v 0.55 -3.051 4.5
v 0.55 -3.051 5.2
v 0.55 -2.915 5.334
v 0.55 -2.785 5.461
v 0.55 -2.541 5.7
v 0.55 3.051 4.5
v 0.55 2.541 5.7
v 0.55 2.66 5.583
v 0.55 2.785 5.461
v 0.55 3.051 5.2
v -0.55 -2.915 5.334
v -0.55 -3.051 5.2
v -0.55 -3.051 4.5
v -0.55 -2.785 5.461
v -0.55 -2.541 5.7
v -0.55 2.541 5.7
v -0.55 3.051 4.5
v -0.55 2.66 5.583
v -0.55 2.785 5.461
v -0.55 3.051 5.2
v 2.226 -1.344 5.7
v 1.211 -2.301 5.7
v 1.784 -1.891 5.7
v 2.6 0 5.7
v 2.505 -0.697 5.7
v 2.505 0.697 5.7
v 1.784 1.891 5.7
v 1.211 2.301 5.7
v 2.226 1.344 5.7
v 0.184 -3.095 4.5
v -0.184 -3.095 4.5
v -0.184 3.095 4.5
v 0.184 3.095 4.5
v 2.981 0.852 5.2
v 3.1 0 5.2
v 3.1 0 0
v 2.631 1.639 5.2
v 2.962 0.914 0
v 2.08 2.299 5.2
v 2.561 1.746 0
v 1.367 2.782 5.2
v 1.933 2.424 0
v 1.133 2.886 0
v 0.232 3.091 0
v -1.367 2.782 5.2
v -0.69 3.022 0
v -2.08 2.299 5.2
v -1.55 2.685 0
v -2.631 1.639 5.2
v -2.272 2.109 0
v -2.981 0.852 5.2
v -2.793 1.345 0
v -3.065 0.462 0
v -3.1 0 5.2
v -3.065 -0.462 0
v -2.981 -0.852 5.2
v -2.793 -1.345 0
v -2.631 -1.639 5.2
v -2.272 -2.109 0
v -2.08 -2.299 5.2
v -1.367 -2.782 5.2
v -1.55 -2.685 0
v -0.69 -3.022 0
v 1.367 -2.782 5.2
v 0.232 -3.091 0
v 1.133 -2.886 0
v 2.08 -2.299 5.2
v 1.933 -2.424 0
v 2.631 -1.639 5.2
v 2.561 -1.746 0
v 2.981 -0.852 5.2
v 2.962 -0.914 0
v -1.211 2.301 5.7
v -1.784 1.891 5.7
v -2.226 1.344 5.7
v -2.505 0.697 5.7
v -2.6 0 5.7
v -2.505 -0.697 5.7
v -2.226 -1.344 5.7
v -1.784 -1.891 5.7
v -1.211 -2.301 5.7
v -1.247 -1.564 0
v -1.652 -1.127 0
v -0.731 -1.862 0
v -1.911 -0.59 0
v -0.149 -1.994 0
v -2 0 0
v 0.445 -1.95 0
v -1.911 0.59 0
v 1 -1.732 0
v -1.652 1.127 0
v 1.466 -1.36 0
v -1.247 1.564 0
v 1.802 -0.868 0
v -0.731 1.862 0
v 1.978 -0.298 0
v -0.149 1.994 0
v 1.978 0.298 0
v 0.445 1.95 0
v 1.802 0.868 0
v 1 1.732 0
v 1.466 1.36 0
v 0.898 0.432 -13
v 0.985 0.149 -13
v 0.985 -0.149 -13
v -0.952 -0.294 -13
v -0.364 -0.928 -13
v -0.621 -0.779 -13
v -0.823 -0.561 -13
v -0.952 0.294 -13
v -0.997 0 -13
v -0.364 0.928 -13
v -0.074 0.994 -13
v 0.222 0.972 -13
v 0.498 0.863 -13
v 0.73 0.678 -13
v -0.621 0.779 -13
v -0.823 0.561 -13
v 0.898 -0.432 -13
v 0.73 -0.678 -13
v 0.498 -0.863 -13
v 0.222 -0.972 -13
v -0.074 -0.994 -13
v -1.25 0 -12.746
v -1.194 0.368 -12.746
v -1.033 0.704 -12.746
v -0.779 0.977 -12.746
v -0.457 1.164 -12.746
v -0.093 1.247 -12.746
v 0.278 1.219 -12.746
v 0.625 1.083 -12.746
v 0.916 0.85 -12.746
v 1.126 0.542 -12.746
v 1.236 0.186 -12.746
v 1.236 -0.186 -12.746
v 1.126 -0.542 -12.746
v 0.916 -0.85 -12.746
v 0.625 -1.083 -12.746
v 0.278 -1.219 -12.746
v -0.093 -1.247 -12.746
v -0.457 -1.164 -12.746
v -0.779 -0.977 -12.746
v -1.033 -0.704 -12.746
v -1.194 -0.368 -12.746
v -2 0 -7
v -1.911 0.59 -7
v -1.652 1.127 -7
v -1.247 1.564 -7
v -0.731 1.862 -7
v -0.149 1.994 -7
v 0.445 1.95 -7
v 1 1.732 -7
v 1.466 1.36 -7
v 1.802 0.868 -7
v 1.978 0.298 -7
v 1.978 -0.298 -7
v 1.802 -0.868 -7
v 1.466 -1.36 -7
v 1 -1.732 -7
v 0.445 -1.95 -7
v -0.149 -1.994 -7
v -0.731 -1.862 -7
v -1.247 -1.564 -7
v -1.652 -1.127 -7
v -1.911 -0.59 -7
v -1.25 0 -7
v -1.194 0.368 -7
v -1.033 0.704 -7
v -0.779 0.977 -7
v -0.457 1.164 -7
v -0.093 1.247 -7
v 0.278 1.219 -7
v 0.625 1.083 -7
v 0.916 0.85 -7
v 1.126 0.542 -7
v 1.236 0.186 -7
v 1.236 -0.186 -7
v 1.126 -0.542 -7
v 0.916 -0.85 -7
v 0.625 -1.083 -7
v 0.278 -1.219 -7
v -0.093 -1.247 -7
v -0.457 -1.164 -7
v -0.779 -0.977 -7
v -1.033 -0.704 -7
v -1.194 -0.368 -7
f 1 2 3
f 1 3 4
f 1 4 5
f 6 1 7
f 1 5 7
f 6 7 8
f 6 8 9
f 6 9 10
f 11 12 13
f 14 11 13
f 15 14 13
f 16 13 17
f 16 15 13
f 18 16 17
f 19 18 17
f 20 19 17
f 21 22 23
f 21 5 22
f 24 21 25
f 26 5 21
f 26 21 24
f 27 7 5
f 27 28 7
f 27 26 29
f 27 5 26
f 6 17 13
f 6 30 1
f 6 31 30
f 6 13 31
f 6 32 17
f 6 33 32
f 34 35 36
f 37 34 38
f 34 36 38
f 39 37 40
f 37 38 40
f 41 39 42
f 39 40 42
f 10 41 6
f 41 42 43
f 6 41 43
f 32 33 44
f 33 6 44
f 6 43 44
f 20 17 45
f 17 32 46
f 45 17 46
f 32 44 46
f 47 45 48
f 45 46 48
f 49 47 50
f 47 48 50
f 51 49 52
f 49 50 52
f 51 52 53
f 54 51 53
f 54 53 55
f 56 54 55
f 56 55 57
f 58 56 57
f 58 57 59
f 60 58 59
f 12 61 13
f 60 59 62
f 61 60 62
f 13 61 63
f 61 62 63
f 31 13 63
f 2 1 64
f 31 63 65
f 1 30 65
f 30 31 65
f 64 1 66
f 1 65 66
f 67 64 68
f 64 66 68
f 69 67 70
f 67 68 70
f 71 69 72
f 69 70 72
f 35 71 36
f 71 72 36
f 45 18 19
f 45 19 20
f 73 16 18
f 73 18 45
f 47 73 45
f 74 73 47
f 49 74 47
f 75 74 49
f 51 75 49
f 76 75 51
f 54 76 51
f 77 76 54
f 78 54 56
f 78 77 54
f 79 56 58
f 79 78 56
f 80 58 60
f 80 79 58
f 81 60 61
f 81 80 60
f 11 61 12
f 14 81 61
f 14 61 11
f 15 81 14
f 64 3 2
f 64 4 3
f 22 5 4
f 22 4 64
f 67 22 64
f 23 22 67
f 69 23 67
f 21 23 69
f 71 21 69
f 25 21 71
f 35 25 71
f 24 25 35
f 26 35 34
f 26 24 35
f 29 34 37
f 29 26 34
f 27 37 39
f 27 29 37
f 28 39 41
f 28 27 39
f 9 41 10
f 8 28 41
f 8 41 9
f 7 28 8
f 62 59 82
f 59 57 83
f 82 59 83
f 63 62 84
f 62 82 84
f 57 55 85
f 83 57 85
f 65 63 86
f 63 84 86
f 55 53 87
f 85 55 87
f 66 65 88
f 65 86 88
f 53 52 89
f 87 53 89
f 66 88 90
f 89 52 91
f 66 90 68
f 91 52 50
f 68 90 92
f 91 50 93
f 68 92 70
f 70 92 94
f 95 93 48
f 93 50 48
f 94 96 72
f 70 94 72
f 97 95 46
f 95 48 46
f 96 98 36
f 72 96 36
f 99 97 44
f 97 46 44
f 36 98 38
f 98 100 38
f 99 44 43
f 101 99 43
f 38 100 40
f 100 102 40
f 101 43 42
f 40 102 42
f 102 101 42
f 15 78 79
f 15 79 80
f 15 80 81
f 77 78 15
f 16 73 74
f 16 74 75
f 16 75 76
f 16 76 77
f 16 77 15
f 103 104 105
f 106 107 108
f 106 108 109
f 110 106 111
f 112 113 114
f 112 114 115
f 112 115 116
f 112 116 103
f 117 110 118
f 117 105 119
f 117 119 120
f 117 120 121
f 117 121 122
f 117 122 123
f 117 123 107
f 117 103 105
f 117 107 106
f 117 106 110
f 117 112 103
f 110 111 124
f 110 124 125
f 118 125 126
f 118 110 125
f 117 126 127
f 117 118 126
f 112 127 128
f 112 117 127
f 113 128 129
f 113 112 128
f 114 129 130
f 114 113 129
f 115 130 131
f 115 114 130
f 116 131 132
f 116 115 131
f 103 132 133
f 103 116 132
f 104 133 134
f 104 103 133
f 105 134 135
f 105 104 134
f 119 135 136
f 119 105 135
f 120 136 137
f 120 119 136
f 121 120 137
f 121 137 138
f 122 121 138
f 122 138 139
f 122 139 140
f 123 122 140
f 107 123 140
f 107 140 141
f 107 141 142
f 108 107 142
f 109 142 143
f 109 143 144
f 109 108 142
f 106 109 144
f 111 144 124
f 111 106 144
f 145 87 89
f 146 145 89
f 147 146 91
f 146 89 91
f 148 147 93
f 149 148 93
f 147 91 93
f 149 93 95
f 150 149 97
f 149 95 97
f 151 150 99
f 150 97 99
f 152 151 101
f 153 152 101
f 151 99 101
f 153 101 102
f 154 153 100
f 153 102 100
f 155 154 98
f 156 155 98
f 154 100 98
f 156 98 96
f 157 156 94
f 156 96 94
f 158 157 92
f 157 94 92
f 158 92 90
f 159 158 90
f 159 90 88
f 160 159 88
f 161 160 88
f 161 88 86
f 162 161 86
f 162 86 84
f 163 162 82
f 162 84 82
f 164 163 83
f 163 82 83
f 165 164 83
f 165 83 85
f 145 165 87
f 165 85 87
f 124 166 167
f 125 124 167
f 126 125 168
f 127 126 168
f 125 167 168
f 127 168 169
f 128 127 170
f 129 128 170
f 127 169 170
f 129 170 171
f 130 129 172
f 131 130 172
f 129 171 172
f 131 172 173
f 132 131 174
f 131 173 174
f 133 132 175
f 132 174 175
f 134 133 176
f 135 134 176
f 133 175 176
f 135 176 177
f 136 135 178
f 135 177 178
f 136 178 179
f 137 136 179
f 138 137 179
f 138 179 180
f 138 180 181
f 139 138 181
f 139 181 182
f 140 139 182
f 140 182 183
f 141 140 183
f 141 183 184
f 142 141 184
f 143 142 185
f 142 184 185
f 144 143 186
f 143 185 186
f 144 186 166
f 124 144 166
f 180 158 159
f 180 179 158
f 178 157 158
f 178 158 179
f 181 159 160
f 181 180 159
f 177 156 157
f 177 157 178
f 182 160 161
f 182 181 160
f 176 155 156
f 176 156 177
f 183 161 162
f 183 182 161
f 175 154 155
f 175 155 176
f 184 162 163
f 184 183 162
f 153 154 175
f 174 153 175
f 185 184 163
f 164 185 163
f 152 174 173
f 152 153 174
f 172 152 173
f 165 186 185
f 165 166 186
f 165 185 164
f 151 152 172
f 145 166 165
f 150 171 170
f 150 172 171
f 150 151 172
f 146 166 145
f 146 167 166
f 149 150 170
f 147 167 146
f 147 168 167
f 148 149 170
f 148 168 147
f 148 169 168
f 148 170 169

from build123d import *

# Parameters (mm, degrees)
SKETCH_1_R          = 3.1
EXTRUDE_1_DEPTH     = 5.7
SKETCH_2_R          = 2
EXTRUDE_2_DEPTH     = 7
SKETCH_3_R          = 1.25
EXTRUDE_3_DEPTH     = 6
CHAMFER_1_SIZE      = 0.2535
CHAMFER_2_SIZE      = 0.5
SKETCH_5_W          = 1.1
SKETCH_5_H          = 7
CUT_EXTRUDE_1_DEPTH = 1.2


with BuildPart() as part:
    # Эскиз1 → Бобышка-Вытянуть1 (new body)
    with BuildSketch(Plane.XY):
        Circle(SKETCH_1_R)
    extrude(amount=EXTRUDE_1_DEPTH)

    # Эскиз2 → Бобышка-Вытянуть2 (add)
    with BuildSketch(Plane(origin=(0, 0, 0), x_dir=(-1, 0, 0), z_dir=(0, 0, -1))):
        Circle(SKETCH_2_R)
    extrude(amount=EXTRUDE_2_DEPTH)

    # Эскиз3 → Бобышка-Вытянуть3 (add)
    with BuildSketch(Plane(origin=(0, 0, -7), x_dir=(-1, 0, 0), z_dir=(0, 0, -1))):
        Circle(SKETCH_3_R)
    extrude(amount=EXTRUDE_3_DEPTH)

    # Фаска1
    chamfer_1_edges = [part.edges().sort_by_distance(p)[0] for p in [
        (1.25, 0, -13),
    ]]
    chamfer(chamfer_1_edges, length=CHAMFER_1_SIZE)

    # Фаска2
    chamfer_2_edges = [part.edges().sort_by_distance(p)[0] for p in [
        (-3.1, 0, 5.7),
    ]]
    chamfer(chamfer_2_edges, length=CHAMFER_2_SIZE)

    # Эскиз5 → Вырез-Вытянуть1 (cut)
    with BuildSketch(Plane.XY.offset(5.7)):
        Rectangle(SKETCH_5_W, SKETCH_5_H)
    extrude(amount=-CUT_EXTRUDE_1_DEPTH, mode=Mode.SUBTRACT)


solid = part.part
